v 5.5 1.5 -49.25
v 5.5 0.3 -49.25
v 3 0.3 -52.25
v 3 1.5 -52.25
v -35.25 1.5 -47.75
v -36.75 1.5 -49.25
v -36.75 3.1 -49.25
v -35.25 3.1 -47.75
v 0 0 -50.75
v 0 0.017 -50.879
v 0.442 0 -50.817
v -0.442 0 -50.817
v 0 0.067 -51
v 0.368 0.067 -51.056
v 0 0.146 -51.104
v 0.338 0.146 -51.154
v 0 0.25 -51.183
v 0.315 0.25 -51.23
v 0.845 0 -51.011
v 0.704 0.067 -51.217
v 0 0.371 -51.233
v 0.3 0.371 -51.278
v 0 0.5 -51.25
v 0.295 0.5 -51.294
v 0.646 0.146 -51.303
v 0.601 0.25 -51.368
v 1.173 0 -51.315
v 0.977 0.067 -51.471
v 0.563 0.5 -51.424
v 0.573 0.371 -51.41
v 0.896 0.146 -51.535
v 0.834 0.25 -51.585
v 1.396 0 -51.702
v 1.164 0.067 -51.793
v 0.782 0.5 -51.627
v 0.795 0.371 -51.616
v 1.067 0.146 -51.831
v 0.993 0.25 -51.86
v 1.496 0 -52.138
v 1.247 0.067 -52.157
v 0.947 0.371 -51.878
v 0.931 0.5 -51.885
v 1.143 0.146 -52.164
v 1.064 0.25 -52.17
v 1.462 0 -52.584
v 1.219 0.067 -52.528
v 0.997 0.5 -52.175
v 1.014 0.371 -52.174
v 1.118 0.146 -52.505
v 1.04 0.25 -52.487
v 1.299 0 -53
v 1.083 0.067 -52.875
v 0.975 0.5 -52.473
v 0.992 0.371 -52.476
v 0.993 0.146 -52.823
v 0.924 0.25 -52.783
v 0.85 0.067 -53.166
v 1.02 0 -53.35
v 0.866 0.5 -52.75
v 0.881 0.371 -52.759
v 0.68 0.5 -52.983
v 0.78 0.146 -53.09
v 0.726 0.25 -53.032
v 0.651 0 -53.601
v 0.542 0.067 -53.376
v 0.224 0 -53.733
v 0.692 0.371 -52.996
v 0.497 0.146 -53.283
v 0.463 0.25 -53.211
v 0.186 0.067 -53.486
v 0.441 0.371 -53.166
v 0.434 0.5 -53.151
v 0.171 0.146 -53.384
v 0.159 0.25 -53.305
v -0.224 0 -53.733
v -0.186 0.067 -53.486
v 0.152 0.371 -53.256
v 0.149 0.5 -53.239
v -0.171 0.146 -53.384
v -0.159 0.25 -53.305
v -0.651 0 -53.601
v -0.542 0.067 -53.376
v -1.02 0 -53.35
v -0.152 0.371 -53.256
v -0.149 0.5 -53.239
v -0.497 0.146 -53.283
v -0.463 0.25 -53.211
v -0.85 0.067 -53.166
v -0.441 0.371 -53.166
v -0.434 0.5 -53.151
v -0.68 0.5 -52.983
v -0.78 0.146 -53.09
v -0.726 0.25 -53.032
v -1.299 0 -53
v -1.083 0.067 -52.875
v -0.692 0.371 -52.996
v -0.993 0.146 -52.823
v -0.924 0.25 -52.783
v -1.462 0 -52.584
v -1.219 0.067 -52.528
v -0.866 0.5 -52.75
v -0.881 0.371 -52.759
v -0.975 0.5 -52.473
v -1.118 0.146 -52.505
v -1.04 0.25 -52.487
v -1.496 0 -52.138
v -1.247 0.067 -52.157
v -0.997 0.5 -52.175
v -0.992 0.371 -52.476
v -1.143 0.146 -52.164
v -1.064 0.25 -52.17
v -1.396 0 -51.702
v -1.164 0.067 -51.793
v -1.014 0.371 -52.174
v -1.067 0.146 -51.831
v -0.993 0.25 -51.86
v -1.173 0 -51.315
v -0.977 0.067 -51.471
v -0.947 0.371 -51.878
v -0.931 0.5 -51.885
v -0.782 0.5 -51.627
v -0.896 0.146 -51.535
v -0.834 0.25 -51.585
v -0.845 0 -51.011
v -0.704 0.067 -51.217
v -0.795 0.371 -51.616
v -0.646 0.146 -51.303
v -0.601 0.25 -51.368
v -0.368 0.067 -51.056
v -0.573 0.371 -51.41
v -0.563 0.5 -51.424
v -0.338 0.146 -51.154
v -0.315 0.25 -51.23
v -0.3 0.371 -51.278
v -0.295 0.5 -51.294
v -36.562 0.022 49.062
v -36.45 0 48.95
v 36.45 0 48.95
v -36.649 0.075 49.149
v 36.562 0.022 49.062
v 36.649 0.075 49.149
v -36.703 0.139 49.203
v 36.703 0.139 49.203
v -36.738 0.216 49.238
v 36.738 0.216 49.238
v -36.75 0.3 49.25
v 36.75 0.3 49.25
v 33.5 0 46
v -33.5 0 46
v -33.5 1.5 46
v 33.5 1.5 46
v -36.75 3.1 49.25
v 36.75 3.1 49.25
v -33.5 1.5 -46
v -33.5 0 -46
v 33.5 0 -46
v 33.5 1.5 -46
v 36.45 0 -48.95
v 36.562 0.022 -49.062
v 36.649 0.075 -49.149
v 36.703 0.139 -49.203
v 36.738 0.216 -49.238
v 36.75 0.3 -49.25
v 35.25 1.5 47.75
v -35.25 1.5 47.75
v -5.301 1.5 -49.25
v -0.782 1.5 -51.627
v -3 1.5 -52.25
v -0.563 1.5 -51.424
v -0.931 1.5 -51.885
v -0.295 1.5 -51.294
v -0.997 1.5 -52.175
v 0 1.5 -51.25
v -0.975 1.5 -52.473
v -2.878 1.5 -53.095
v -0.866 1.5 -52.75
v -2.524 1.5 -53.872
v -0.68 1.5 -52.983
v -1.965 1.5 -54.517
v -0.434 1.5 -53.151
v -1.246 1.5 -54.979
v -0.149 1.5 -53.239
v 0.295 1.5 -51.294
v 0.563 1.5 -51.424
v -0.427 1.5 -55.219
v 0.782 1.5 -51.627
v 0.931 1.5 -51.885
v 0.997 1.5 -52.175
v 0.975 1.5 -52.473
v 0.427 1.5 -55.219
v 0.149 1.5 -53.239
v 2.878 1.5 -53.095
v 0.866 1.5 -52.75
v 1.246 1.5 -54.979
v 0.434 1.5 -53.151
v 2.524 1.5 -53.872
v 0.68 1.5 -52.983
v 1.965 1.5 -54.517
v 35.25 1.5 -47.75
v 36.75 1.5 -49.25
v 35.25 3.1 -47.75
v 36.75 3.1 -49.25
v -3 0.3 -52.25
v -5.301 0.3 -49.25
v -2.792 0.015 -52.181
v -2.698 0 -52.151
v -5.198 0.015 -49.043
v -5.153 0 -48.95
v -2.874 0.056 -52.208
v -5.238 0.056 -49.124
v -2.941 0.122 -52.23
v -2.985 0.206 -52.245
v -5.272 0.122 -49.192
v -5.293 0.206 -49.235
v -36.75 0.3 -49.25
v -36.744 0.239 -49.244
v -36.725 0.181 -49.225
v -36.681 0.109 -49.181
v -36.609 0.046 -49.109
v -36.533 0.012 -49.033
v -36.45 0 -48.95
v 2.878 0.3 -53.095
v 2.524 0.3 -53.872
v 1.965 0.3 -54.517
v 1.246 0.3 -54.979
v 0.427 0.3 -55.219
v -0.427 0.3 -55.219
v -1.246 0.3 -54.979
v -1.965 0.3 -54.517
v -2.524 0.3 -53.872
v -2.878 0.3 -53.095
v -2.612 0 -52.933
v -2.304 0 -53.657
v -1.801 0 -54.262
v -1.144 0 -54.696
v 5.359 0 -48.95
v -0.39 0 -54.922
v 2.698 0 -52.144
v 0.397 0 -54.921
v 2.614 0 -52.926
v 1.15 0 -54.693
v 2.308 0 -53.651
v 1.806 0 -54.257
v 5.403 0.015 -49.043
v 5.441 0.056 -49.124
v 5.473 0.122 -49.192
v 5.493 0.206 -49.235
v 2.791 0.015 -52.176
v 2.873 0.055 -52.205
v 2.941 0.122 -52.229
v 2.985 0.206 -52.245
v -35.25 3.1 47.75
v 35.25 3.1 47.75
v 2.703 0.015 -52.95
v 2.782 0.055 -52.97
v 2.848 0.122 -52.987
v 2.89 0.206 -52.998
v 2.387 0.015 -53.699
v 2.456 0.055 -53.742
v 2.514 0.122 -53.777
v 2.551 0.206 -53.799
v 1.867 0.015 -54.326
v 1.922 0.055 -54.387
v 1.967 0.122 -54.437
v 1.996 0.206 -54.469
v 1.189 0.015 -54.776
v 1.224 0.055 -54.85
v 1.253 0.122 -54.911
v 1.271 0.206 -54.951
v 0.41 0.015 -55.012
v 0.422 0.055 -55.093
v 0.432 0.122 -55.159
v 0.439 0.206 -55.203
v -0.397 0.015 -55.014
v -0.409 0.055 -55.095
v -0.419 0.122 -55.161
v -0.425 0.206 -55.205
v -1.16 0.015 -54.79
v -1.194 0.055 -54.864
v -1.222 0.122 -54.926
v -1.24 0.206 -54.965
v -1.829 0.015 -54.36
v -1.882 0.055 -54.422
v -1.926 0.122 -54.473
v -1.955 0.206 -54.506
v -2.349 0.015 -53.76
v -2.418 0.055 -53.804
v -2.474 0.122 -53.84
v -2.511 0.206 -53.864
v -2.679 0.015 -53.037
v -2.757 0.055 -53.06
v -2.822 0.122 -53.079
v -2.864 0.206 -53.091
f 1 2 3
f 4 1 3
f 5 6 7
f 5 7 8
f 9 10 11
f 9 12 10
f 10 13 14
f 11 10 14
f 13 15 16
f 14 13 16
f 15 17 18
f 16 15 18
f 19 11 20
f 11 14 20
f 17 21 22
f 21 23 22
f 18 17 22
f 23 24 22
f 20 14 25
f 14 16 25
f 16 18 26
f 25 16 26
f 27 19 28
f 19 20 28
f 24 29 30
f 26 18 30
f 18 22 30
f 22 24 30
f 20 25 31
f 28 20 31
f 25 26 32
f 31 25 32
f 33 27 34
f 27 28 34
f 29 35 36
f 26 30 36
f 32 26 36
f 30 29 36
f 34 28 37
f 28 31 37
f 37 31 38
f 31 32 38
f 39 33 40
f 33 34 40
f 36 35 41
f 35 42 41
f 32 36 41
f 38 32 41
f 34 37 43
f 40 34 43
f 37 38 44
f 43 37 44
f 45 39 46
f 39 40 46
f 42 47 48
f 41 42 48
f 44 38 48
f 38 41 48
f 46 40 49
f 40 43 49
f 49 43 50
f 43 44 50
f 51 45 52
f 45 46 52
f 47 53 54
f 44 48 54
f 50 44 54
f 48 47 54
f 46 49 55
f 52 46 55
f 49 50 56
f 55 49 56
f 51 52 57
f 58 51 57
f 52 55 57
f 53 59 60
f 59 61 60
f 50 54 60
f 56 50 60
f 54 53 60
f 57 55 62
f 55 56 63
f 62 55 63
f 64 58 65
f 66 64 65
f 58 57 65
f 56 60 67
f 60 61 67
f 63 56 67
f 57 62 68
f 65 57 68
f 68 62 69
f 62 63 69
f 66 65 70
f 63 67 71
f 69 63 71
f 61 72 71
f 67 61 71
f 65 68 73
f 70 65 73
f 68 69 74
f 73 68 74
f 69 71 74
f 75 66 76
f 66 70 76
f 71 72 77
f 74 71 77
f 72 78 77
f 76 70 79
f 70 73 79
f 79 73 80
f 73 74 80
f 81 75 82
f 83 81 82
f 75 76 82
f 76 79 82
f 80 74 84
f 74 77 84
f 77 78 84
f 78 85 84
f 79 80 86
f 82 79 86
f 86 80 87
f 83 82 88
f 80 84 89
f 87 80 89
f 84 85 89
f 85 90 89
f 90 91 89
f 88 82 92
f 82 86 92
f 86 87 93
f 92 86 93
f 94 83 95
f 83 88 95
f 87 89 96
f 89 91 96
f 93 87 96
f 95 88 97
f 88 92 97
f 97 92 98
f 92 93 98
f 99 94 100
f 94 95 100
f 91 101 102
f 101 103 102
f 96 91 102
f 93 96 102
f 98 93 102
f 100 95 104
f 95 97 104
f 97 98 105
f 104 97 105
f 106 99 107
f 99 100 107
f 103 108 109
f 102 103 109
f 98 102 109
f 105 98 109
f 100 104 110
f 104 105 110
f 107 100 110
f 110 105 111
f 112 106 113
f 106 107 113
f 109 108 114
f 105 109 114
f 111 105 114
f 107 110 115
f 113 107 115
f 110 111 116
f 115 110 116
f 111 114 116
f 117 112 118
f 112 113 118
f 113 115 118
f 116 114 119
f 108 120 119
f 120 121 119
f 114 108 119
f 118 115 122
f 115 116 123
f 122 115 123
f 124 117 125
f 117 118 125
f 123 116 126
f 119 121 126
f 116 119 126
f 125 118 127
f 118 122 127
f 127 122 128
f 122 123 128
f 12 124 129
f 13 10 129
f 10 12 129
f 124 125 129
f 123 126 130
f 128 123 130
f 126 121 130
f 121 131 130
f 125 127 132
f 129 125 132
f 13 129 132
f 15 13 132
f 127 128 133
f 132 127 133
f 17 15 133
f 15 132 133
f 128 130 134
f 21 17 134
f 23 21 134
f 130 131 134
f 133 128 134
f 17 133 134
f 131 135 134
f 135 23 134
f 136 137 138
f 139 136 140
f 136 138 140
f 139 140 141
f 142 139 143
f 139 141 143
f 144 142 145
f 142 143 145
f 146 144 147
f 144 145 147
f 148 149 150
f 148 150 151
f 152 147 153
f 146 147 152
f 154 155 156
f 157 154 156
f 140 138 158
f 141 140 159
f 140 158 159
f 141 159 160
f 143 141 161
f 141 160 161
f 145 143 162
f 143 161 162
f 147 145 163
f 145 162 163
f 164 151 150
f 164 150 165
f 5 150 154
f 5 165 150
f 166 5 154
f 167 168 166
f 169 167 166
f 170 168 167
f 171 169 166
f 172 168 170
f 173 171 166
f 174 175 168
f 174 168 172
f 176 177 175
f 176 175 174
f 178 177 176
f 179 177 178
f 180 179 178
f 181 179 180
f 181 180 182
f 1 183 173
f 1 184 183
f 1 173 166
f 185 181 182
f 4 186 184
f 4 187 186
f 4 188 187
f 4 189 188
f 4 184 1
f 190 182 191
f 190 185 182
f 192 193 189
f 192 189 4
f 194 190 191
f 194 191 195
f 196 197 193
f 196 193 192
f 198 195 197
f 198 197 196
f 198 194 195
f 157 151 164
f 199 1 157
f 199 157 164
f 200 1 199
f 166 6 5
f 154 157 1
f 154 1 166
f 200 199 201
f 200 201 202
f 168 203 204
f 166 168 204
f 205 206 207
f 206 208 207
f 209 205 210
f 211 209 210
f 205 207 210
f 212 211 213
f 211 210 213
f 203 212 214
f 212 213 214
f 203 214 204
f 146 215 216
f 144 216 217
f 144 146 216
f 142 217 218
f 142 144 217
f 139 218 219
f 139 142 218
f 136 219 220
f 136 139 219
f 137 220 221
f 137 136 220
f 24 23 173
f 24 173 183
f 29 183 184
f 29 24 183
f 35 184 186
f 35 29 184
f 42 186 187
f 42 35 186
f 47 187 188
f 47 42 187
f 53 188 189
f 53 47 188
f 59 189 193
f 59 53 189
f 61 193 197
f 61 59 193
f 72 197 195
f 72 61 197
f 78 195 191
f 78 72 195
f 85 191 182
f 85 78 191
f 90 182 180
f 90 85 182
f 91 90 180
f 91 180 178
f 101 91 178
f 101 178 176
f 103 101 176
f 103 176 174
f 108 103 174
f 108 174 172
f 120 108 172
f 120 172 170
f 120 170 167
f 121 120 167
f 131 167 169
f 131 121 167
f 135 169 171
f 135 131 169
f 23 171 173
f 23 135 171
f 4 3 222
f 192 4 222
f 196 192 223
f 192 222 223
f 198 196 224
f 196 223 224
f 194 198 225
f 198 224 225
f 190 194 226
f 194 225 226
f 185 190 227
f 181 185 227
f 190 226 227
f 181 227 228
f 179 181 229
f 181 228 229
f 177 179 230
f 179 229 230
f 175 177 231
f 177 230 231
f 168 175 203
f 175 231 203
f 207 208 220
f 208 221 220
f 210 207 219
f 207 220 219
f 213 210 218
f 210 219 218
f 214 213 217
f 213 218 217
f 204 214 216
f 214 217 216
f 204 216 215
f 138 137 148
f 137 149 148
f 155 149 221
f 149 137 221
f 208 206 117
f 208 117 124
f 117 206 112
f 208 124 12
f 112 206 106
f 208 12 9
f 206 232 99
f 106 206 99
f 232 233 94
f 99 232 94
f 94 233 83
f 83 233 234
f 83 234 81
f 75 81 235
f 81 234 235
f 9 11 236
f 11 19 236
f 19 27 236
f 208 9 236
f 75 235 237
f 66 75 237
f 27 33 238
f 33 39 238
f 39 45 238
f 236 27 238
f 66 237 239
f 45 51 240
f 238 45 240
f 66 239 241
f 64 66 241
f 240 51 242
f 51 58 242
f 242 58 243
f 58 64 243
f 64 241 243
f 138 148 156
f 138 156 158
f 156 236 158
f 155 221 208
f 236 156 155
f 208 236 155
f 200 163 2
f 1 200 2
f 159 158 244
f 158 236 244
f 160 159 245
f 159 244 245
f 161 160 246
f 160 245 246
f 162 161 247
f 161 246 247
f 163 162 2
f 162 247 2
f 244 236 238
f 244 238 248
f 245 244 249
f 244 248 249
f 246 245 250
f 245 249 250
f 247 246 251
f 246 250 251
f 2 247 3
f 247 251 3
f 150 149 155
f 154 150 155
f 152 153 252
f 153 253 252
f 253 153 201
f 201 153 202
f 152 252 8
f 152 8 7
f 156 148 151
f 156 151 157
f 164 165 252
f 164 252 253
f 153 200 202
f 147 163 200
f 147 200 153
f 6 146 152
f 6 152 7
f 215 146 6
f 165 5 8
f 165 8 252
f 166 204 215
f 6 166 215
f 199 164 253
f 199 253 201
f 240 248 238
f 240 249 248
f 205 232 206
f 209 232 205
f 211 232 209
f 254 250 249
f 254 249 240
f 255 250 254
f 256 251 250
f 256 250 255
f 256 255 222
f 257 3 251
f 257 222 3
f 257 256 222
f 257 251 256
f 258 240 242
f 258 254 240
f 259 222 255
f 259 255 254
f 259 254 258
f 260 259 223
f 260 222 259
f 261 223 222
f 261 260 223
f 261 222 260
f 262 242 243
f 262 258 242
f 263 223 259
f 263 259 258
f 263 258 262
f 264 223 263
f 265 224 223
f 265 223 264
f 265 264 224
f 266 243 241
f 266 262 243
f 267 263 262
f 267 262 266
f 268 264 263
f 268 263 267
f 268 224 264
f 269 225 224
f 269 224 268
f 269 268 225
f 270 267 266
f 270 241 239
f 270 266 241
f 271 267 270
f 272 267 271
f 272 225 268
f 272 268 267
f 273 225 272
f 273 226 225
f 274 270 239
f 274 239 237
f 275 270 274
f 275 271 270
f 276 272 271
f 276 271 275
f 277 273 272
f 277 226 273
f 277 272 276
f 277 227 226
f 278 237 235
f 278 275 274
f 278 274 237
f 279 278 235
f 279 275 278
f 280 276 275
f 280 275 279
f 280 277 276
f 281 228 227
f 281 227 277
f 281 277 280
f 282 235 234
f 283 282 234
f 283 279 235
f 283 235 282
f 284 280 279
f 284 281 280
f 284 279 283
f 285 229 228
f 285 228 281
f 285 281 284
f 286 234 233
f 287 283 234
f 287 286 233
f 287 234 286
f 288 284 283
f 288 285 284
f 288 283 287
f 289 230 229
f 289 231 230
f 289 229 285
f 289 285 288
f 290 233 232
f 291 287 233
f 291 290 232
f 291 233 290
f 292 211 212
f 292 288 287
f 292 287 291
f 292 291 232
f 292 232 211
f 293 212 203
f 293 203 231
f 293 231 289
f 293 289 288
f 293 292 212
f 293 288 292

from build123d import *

# Parameters (mm, degrees)
SKETCH_1_R      = 1
SKETCH_1_W      = 67
SKETCH_1_H      = 92
EXTRUDE_1_DEPTH = 1.5
EXTRUDE_2_DEPTH = 1.6
FILLET_1_R      = 0.3
FILLET_2_R      = 0.5


with BuildPart() as part:
    # Эскиз1 → Бобышка-Вытянуть1 (new body)
    with BuildSketch(Plane(origin=(0, 0, 0), x_dir=(1, 0, 0), z_dir=(0, 1, 0))):
        with BuildLine():
            Line((36.75, 49.25), (5.5, 49.25))
            Line((5.5, 49.25), (3, 52.25))
            ThreePointArc((3, 52.25), (0, 55.25), (-3, 52.25))
            Line((-3, 52.25), (-5.300530524, 49.25))
            Line((-5.300530524, 49.25), (-36.75, 49.25))
            Line((-36.75, 49.25), (-36.75, -49.25))
            Line((-36.75, -49.25), (36.75, -49.25))
            Line((36.75, -49.25), (36.75, 49.25))
        make_face()
        with Locations(Location((0, 52.25, 0), (0, 0, 270))):
            Circle(SKETCH_1_R, mode=Mode.SUBTRACT)
        Rectangle(SKETCH_1_W, SKETCH_1_H, mode=Mode.SUBTRACT)
    extrude(amount=EXTRUDE_1_DEPTH)

    # Эскиз2 → Бобышка-Вытянуть2 (add)
    with BuildSketch(Plane(origin=(0, 1.5, 0), x_dir=(1, 0, 0), z_dir=(0, 1, 0))):
        Polygon((35.25, 47.75), (36.75, 49.25), (36.75, -49.25), (-36.75, -49.25), (-36.75, 49.25), (-35.25, 47.75), (-35.25, -47.75), (35.25, -47.75), align=None)
    extrude(amount=EXTRUDE_2_DEPTH)

    # Скругление1
    fillet_1_edges = [part.edges().sort_by_distance(p)[0] for p in [
        (21.125, 0, -49.25),
        (36.75, 0, 0),
        (0, 0, 49.25),
        (-36.75, 0, 0),
        (-21.025265262, 0, -49.25),
        (-4.150265262, 0, -50.75),
        (0, 0, -55.25),
        (4.25, 0, -50.75),
    ]]
    fillet(fillet_1_edges, radius=FILLET_1_R)

    # Скругление2
    fillet_2_edges = [part.edges().sort_by_distance(p)[0] for p in [
        (0, 0, -53.25),
    ]]
    fillet(fillet_2_edges, radius=FILLET_2_R)


solid = part.part
